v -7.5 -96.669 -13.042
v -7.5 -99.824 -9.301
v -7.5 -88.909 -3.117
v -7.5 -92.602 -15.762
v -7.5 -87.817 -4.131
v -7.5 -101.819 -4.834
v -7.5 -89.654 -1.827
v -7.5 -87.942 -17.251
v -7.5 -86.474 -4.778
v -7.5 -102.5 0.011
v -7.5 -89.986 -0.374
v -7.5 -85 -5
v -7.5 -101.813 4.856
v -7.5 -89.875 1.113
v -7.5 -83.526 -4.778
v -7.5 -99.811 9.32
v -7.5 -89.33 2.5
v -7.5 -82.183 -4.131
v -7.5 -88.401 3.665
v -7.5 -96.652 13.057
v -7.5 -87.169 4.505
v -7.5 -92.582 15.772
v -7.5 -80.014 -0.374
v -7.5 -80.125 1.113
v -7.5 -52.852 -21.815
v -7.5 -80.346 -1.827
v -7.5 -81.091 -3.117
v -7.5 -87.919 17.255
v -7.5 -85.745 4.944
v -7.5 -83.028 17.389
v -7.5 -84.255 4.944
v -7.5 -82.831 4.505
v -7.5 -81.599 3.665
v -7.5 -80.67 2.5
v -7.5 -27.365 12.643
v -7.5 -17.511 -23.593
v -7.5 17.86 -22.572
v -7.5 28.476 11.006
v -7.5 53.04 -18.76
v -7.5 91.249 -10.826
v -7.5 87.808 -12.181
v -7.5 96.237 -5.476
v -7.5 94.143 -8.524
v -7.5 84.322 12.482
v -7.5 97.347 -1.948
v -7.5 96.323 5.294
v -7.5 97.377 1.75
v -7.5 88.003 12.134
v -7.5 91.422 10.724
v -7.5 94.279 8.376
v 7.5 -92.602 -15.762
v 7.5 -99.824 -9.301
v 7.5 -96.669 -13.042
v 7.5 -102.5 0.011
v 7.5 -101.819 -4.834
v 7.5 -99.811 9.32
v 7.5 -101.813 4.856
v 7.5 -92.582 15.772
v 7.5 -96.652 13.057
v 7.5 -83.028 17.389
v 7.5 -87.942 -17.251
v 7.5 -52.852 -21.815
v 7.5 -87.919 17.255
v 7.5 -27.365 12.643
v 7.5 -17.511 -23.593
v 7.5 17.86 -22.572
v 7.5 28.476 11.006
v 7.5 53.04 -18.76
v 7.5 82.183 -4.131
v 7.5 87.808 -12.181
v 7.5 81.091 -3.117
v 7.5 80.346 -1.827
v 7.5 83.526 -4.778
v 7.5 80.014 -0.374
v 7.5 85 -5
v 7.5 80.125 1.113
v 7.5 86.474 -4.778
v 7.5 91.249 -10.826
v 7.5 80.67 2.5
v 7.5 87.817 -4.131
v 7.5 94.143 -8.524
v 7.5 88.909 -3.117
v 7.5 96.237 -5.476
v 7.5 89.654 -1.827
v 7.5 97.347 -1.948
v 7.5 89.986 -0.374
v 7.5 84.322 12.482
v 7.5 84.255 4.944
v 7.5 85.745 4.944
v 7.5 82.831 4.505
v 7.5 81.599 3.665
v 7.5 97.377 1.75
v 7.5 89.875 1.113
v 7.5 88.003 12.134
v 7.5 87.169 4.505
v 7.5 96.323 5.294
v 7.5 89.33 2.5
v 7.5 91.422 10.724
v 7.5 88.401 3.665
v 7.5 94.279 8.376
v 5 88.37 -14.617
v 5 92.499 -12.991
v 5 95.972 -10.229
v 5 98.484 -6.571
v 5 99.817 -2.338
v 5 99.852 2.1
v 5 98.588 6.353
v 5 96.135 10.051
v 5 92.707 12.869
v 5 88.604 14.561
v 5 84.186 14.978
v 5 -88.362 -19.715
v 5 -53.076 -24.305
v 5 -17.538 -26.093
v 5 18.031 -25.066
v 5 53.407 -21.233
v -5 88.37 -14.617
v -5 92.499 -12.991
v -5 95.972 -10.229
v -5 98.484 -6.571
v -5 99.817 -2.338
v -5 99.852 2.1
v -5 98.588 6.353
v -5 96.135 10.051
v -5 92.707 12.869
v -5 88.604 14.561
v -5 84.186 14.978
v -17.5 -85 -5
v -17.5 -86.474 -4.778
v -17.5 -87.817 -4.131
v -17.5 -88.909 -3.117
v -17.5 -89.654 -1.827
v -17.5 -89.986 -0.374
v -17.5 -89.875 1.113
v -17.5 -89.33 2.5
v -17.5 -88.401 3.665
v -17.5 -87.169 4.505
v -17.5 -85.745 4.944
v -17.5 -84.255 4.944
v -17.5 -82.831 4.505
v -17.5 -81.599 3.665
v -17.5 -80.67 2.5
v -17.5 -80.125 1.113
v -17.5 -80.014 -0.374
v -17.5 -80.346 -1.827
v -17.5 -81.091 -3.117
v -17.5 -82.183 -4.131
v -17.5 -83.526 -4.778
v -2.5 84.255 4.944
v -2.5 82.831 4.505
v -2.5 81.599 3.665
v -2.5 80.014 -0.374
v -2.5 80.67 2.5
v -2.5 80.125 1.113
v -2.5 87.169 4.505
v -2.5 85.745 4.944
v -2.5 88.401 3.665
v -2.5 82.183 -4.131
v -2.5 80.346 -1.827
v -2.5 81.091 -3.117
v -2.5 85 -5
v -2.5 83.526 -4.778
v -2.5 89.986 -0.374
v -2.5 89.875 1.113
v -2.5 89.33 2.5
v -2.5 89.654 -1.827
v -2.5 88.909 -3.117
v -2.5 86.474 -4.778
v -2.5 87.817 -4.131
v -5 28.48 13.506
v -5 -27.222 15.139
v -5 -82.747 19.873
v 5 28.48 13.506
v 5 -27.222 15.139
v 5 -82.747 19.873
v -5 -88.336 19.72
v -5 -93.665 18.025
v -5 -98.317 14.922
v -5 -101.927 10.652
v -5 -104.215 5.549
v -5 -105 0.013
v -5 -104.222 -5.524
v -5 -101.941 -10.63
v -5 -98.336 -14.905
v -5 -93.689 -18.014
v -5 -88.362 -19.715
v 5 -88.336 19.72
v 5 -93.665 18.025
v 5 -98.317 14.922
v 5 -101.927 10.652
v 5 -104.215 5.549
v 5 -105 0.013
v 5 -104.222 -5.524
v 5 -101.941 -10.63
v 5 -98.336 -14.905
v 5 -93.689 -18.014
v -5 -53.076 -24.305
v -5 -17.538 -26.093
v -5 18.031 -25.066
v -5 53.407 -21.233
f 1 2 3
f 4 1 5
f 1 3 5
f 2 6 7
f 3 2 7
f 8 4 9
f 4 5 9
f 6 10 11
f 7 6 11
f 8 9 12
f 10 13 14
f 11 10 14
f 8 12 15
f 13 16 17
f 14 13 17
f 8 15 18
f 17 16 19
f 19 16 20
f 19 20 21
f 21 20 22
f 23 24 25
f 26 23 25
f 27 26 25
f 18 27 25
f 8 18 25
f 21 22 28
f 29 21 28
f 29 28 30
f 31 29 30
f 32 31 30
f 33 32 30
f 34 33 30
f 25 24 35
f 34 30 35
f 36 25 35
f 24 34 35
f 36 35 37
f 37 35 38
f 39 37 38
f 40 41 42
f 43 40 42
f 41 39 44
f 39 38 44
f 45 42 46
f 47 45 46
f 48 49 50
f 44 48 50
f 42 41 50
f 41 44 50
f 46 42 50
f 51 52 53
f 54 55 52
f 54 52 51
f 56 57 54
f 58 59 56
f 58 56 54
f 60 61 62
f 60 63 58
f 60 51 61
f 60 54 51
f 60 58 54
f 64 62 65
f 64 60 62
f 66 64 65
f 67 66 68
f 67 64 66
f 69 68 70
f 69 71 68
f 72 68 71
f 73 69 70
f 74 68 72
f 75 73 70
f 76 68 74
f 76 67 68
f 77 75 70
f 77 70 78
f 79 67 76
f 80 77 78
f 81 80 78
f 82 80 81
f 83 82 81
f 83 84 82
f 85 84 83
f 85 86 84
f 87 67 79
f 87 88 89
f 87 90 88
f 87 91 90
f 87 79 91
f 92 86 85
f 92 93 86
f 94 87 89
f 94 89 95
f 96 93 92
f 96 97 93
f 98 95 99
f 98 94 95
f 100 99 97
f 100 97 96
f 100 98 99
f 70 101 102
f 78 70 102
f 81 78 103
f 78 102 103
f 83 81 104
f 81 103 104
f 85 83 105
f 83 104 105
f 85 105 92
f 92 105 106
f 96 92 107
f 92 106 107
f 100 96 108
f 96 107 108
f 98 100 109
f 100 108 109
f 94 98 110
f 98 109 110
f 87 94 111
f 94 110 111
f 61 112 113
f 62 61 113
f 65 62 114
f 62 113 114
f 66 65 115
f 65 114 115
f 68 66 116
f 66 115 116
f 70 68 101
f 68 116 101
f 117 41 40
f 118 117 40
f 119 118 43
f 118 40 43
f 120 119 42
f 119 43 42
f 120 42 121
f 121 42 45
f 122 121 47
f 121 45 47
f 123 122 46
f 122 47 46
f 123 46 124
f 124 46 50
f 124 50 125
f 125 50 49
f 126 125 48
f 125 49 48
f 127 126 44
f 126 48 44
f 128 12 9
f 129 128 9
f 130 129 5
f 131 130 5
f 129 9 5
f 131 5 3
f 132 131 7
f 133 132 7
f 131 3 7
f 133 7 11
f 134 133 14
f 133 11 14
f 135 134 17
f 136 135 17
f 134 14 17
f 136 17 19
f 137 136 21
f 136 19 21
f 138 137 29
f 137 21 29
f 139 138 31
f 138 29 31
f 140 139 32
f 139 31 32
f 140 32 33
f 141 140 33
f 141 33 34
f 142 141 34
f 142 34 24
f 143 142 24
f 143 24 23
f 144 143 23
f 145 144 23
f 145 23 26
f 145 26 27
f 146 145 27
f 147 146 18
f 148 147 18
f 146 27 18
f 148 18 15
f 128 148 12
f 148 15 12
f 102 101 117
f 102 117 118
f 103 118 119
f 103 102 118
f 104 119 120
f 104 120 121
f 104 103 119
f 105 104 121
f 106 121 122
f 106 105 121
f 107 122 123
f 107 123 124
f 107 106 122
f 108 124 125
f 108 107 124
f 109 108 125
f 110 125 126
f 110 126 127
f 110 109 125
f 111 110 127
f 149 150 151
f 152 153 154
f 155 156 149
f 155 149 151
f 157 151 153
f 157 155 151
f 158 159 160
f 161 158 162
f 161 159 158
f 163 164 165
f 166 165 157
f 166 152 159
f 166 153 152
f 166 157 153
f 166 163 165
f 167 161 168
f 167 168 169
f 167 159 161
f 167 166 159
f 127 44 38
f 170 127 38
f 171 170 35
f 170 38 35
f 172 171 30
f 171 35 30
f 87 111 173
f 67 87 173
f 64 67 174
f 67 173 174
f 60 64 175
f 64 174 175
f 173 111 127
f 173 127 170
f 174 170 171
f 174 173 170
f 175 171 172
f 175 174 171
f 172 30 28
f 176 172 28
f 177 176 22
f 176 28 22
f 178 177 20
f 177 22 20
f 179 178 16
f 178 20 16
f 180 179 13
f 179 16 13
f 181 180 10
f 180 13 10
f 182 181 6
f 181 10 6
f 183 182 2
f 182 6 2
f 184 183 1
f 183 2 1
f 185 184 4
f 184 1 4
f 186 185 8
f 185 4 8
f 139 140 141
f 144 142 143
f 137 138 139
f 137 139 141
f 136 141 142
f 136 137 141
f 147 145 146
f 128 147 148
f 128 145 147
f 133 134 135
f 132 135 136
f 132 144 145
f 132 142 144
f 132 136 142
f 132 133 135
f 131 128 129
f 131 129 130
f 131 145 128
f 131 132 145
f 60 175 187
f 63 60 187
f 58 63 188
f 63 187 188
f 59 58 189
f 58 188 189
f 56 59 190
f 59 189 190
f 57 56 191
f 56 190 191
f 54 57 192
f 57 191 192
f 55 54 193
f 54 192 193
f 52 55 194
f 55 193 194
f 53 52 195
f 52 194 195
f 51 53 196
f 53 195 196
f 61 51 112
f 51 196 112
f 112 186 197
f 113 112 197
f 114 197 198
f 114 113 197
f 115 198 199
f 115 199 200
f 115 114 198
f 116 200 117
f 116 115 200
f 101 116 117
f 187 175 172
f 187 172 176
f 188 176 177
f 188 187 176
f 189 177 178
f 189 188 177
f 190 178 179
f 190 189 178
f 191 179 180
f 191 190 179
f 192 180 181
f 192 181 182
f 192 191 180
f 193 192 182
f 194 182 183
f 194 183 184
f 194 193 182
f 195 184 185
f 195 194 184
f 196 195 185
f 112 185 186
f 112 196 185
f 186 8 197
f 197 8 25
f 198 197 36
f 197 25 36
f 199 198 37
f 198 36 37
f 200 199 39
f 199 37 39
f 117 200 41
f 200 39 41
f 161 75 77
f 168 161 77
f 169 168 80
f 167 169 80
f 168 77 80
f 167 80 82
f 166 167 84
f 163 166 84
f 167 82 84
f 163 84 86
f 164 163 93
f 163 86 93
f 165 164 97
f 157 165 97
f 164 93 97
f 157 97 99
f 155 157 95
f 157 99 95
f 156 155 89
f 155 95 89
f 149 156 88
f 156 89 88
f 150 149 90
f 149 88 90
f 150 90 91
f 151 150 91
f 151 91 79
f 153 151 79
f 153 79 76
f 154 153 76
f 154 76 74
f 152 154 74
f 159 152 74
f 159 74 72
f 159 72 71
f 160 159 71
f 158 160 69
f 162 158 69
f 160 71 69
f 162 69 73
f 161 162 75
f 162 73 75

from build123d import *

# Parameters (mm, degrees)
BOSS_EXTRUDE1_DEPTH = 7.5
CHAMFER1_SIZE       = 2.5
SKETCH2_R           = 5
BOSS_EXTRUDE2_DEPTH = 10
SKETCH3_R           = 5
CUT_EXTRUDE1_DEPTH  = 10


with BuildPart() as part:
    # Sketch1 → Boss-Extrude1 (new, symmetric)
    with BuildSketch(Plane.YZ):
        with BuildLine():
            ThreePointArc((-82.746539792, 19.872642429), (-104.801791361, 2.808746854), (-88.361833105, -19.715427415))
            ThreePointArc((-88.361833105, -19.715427415), (0.256800738, -25.931146508), (88.369675456, -14.61660998))
            ThreePointArc((88.369675456, -14.61660998), (99.852333231, 2.099570811), (84.186105477, 14.977902914))
            ThreePointArc((84.186105477, 14.977902914), (0.617423728, 13.934366249), (-82.746539792, 19.872642429))
        make_face()
    extrude(amount=BOSS_EXTRUDE1_DEPTH, both=True)

    # Chamfer1
    chamfer1_edges = [part.edges().sort_by_distance(p)[0] for p in [
        (7.5, 0.256800738, -25.931146508),
        (7.5, 99.852333231, 2.099570811),
        (7.5, 0.617423728, 13.934366249),
        (-7.5, 99.852333231, 2.099570811),
        (-7.5, 0.256800738, -25.931146508),
        (-7.5, -104.801791361, 2.808746854),
        (-7.5, 0.617423728, 13.934366249),
        (7.5, -104.801791361, 2.808746854),
    ]]
    chamfer(chamfer1_edges, length=CHAMFER1_SIZE)

    # Sketch2 → Boss-Extrude2 (add)
    with BuildSketch(Plane(origin=(-7.5, 0, 0), x_dir=(0, -1, 0), z_dir=(-1, 0, 0))):
        with Locations(Location((85, 0, 0), (0, 0, 270))):
            Circle(SKETCH2_R)
    extrude(amount=BOSS_EXTRUDE2_DEPTH)

    # Sketch3 → Cut-Extrude1 (cut)
    with BuildSketch(Plane.YZ.offset(7.5)):
        with Locations(Location((85, 0, 0), (0, 0, 270))):
            Circle(SKETCH3_R)
    extrude(amount=-CUT_EXTRUDE1_DEPTH, mode=Mode.SUBTRACT)


solid = part.part
